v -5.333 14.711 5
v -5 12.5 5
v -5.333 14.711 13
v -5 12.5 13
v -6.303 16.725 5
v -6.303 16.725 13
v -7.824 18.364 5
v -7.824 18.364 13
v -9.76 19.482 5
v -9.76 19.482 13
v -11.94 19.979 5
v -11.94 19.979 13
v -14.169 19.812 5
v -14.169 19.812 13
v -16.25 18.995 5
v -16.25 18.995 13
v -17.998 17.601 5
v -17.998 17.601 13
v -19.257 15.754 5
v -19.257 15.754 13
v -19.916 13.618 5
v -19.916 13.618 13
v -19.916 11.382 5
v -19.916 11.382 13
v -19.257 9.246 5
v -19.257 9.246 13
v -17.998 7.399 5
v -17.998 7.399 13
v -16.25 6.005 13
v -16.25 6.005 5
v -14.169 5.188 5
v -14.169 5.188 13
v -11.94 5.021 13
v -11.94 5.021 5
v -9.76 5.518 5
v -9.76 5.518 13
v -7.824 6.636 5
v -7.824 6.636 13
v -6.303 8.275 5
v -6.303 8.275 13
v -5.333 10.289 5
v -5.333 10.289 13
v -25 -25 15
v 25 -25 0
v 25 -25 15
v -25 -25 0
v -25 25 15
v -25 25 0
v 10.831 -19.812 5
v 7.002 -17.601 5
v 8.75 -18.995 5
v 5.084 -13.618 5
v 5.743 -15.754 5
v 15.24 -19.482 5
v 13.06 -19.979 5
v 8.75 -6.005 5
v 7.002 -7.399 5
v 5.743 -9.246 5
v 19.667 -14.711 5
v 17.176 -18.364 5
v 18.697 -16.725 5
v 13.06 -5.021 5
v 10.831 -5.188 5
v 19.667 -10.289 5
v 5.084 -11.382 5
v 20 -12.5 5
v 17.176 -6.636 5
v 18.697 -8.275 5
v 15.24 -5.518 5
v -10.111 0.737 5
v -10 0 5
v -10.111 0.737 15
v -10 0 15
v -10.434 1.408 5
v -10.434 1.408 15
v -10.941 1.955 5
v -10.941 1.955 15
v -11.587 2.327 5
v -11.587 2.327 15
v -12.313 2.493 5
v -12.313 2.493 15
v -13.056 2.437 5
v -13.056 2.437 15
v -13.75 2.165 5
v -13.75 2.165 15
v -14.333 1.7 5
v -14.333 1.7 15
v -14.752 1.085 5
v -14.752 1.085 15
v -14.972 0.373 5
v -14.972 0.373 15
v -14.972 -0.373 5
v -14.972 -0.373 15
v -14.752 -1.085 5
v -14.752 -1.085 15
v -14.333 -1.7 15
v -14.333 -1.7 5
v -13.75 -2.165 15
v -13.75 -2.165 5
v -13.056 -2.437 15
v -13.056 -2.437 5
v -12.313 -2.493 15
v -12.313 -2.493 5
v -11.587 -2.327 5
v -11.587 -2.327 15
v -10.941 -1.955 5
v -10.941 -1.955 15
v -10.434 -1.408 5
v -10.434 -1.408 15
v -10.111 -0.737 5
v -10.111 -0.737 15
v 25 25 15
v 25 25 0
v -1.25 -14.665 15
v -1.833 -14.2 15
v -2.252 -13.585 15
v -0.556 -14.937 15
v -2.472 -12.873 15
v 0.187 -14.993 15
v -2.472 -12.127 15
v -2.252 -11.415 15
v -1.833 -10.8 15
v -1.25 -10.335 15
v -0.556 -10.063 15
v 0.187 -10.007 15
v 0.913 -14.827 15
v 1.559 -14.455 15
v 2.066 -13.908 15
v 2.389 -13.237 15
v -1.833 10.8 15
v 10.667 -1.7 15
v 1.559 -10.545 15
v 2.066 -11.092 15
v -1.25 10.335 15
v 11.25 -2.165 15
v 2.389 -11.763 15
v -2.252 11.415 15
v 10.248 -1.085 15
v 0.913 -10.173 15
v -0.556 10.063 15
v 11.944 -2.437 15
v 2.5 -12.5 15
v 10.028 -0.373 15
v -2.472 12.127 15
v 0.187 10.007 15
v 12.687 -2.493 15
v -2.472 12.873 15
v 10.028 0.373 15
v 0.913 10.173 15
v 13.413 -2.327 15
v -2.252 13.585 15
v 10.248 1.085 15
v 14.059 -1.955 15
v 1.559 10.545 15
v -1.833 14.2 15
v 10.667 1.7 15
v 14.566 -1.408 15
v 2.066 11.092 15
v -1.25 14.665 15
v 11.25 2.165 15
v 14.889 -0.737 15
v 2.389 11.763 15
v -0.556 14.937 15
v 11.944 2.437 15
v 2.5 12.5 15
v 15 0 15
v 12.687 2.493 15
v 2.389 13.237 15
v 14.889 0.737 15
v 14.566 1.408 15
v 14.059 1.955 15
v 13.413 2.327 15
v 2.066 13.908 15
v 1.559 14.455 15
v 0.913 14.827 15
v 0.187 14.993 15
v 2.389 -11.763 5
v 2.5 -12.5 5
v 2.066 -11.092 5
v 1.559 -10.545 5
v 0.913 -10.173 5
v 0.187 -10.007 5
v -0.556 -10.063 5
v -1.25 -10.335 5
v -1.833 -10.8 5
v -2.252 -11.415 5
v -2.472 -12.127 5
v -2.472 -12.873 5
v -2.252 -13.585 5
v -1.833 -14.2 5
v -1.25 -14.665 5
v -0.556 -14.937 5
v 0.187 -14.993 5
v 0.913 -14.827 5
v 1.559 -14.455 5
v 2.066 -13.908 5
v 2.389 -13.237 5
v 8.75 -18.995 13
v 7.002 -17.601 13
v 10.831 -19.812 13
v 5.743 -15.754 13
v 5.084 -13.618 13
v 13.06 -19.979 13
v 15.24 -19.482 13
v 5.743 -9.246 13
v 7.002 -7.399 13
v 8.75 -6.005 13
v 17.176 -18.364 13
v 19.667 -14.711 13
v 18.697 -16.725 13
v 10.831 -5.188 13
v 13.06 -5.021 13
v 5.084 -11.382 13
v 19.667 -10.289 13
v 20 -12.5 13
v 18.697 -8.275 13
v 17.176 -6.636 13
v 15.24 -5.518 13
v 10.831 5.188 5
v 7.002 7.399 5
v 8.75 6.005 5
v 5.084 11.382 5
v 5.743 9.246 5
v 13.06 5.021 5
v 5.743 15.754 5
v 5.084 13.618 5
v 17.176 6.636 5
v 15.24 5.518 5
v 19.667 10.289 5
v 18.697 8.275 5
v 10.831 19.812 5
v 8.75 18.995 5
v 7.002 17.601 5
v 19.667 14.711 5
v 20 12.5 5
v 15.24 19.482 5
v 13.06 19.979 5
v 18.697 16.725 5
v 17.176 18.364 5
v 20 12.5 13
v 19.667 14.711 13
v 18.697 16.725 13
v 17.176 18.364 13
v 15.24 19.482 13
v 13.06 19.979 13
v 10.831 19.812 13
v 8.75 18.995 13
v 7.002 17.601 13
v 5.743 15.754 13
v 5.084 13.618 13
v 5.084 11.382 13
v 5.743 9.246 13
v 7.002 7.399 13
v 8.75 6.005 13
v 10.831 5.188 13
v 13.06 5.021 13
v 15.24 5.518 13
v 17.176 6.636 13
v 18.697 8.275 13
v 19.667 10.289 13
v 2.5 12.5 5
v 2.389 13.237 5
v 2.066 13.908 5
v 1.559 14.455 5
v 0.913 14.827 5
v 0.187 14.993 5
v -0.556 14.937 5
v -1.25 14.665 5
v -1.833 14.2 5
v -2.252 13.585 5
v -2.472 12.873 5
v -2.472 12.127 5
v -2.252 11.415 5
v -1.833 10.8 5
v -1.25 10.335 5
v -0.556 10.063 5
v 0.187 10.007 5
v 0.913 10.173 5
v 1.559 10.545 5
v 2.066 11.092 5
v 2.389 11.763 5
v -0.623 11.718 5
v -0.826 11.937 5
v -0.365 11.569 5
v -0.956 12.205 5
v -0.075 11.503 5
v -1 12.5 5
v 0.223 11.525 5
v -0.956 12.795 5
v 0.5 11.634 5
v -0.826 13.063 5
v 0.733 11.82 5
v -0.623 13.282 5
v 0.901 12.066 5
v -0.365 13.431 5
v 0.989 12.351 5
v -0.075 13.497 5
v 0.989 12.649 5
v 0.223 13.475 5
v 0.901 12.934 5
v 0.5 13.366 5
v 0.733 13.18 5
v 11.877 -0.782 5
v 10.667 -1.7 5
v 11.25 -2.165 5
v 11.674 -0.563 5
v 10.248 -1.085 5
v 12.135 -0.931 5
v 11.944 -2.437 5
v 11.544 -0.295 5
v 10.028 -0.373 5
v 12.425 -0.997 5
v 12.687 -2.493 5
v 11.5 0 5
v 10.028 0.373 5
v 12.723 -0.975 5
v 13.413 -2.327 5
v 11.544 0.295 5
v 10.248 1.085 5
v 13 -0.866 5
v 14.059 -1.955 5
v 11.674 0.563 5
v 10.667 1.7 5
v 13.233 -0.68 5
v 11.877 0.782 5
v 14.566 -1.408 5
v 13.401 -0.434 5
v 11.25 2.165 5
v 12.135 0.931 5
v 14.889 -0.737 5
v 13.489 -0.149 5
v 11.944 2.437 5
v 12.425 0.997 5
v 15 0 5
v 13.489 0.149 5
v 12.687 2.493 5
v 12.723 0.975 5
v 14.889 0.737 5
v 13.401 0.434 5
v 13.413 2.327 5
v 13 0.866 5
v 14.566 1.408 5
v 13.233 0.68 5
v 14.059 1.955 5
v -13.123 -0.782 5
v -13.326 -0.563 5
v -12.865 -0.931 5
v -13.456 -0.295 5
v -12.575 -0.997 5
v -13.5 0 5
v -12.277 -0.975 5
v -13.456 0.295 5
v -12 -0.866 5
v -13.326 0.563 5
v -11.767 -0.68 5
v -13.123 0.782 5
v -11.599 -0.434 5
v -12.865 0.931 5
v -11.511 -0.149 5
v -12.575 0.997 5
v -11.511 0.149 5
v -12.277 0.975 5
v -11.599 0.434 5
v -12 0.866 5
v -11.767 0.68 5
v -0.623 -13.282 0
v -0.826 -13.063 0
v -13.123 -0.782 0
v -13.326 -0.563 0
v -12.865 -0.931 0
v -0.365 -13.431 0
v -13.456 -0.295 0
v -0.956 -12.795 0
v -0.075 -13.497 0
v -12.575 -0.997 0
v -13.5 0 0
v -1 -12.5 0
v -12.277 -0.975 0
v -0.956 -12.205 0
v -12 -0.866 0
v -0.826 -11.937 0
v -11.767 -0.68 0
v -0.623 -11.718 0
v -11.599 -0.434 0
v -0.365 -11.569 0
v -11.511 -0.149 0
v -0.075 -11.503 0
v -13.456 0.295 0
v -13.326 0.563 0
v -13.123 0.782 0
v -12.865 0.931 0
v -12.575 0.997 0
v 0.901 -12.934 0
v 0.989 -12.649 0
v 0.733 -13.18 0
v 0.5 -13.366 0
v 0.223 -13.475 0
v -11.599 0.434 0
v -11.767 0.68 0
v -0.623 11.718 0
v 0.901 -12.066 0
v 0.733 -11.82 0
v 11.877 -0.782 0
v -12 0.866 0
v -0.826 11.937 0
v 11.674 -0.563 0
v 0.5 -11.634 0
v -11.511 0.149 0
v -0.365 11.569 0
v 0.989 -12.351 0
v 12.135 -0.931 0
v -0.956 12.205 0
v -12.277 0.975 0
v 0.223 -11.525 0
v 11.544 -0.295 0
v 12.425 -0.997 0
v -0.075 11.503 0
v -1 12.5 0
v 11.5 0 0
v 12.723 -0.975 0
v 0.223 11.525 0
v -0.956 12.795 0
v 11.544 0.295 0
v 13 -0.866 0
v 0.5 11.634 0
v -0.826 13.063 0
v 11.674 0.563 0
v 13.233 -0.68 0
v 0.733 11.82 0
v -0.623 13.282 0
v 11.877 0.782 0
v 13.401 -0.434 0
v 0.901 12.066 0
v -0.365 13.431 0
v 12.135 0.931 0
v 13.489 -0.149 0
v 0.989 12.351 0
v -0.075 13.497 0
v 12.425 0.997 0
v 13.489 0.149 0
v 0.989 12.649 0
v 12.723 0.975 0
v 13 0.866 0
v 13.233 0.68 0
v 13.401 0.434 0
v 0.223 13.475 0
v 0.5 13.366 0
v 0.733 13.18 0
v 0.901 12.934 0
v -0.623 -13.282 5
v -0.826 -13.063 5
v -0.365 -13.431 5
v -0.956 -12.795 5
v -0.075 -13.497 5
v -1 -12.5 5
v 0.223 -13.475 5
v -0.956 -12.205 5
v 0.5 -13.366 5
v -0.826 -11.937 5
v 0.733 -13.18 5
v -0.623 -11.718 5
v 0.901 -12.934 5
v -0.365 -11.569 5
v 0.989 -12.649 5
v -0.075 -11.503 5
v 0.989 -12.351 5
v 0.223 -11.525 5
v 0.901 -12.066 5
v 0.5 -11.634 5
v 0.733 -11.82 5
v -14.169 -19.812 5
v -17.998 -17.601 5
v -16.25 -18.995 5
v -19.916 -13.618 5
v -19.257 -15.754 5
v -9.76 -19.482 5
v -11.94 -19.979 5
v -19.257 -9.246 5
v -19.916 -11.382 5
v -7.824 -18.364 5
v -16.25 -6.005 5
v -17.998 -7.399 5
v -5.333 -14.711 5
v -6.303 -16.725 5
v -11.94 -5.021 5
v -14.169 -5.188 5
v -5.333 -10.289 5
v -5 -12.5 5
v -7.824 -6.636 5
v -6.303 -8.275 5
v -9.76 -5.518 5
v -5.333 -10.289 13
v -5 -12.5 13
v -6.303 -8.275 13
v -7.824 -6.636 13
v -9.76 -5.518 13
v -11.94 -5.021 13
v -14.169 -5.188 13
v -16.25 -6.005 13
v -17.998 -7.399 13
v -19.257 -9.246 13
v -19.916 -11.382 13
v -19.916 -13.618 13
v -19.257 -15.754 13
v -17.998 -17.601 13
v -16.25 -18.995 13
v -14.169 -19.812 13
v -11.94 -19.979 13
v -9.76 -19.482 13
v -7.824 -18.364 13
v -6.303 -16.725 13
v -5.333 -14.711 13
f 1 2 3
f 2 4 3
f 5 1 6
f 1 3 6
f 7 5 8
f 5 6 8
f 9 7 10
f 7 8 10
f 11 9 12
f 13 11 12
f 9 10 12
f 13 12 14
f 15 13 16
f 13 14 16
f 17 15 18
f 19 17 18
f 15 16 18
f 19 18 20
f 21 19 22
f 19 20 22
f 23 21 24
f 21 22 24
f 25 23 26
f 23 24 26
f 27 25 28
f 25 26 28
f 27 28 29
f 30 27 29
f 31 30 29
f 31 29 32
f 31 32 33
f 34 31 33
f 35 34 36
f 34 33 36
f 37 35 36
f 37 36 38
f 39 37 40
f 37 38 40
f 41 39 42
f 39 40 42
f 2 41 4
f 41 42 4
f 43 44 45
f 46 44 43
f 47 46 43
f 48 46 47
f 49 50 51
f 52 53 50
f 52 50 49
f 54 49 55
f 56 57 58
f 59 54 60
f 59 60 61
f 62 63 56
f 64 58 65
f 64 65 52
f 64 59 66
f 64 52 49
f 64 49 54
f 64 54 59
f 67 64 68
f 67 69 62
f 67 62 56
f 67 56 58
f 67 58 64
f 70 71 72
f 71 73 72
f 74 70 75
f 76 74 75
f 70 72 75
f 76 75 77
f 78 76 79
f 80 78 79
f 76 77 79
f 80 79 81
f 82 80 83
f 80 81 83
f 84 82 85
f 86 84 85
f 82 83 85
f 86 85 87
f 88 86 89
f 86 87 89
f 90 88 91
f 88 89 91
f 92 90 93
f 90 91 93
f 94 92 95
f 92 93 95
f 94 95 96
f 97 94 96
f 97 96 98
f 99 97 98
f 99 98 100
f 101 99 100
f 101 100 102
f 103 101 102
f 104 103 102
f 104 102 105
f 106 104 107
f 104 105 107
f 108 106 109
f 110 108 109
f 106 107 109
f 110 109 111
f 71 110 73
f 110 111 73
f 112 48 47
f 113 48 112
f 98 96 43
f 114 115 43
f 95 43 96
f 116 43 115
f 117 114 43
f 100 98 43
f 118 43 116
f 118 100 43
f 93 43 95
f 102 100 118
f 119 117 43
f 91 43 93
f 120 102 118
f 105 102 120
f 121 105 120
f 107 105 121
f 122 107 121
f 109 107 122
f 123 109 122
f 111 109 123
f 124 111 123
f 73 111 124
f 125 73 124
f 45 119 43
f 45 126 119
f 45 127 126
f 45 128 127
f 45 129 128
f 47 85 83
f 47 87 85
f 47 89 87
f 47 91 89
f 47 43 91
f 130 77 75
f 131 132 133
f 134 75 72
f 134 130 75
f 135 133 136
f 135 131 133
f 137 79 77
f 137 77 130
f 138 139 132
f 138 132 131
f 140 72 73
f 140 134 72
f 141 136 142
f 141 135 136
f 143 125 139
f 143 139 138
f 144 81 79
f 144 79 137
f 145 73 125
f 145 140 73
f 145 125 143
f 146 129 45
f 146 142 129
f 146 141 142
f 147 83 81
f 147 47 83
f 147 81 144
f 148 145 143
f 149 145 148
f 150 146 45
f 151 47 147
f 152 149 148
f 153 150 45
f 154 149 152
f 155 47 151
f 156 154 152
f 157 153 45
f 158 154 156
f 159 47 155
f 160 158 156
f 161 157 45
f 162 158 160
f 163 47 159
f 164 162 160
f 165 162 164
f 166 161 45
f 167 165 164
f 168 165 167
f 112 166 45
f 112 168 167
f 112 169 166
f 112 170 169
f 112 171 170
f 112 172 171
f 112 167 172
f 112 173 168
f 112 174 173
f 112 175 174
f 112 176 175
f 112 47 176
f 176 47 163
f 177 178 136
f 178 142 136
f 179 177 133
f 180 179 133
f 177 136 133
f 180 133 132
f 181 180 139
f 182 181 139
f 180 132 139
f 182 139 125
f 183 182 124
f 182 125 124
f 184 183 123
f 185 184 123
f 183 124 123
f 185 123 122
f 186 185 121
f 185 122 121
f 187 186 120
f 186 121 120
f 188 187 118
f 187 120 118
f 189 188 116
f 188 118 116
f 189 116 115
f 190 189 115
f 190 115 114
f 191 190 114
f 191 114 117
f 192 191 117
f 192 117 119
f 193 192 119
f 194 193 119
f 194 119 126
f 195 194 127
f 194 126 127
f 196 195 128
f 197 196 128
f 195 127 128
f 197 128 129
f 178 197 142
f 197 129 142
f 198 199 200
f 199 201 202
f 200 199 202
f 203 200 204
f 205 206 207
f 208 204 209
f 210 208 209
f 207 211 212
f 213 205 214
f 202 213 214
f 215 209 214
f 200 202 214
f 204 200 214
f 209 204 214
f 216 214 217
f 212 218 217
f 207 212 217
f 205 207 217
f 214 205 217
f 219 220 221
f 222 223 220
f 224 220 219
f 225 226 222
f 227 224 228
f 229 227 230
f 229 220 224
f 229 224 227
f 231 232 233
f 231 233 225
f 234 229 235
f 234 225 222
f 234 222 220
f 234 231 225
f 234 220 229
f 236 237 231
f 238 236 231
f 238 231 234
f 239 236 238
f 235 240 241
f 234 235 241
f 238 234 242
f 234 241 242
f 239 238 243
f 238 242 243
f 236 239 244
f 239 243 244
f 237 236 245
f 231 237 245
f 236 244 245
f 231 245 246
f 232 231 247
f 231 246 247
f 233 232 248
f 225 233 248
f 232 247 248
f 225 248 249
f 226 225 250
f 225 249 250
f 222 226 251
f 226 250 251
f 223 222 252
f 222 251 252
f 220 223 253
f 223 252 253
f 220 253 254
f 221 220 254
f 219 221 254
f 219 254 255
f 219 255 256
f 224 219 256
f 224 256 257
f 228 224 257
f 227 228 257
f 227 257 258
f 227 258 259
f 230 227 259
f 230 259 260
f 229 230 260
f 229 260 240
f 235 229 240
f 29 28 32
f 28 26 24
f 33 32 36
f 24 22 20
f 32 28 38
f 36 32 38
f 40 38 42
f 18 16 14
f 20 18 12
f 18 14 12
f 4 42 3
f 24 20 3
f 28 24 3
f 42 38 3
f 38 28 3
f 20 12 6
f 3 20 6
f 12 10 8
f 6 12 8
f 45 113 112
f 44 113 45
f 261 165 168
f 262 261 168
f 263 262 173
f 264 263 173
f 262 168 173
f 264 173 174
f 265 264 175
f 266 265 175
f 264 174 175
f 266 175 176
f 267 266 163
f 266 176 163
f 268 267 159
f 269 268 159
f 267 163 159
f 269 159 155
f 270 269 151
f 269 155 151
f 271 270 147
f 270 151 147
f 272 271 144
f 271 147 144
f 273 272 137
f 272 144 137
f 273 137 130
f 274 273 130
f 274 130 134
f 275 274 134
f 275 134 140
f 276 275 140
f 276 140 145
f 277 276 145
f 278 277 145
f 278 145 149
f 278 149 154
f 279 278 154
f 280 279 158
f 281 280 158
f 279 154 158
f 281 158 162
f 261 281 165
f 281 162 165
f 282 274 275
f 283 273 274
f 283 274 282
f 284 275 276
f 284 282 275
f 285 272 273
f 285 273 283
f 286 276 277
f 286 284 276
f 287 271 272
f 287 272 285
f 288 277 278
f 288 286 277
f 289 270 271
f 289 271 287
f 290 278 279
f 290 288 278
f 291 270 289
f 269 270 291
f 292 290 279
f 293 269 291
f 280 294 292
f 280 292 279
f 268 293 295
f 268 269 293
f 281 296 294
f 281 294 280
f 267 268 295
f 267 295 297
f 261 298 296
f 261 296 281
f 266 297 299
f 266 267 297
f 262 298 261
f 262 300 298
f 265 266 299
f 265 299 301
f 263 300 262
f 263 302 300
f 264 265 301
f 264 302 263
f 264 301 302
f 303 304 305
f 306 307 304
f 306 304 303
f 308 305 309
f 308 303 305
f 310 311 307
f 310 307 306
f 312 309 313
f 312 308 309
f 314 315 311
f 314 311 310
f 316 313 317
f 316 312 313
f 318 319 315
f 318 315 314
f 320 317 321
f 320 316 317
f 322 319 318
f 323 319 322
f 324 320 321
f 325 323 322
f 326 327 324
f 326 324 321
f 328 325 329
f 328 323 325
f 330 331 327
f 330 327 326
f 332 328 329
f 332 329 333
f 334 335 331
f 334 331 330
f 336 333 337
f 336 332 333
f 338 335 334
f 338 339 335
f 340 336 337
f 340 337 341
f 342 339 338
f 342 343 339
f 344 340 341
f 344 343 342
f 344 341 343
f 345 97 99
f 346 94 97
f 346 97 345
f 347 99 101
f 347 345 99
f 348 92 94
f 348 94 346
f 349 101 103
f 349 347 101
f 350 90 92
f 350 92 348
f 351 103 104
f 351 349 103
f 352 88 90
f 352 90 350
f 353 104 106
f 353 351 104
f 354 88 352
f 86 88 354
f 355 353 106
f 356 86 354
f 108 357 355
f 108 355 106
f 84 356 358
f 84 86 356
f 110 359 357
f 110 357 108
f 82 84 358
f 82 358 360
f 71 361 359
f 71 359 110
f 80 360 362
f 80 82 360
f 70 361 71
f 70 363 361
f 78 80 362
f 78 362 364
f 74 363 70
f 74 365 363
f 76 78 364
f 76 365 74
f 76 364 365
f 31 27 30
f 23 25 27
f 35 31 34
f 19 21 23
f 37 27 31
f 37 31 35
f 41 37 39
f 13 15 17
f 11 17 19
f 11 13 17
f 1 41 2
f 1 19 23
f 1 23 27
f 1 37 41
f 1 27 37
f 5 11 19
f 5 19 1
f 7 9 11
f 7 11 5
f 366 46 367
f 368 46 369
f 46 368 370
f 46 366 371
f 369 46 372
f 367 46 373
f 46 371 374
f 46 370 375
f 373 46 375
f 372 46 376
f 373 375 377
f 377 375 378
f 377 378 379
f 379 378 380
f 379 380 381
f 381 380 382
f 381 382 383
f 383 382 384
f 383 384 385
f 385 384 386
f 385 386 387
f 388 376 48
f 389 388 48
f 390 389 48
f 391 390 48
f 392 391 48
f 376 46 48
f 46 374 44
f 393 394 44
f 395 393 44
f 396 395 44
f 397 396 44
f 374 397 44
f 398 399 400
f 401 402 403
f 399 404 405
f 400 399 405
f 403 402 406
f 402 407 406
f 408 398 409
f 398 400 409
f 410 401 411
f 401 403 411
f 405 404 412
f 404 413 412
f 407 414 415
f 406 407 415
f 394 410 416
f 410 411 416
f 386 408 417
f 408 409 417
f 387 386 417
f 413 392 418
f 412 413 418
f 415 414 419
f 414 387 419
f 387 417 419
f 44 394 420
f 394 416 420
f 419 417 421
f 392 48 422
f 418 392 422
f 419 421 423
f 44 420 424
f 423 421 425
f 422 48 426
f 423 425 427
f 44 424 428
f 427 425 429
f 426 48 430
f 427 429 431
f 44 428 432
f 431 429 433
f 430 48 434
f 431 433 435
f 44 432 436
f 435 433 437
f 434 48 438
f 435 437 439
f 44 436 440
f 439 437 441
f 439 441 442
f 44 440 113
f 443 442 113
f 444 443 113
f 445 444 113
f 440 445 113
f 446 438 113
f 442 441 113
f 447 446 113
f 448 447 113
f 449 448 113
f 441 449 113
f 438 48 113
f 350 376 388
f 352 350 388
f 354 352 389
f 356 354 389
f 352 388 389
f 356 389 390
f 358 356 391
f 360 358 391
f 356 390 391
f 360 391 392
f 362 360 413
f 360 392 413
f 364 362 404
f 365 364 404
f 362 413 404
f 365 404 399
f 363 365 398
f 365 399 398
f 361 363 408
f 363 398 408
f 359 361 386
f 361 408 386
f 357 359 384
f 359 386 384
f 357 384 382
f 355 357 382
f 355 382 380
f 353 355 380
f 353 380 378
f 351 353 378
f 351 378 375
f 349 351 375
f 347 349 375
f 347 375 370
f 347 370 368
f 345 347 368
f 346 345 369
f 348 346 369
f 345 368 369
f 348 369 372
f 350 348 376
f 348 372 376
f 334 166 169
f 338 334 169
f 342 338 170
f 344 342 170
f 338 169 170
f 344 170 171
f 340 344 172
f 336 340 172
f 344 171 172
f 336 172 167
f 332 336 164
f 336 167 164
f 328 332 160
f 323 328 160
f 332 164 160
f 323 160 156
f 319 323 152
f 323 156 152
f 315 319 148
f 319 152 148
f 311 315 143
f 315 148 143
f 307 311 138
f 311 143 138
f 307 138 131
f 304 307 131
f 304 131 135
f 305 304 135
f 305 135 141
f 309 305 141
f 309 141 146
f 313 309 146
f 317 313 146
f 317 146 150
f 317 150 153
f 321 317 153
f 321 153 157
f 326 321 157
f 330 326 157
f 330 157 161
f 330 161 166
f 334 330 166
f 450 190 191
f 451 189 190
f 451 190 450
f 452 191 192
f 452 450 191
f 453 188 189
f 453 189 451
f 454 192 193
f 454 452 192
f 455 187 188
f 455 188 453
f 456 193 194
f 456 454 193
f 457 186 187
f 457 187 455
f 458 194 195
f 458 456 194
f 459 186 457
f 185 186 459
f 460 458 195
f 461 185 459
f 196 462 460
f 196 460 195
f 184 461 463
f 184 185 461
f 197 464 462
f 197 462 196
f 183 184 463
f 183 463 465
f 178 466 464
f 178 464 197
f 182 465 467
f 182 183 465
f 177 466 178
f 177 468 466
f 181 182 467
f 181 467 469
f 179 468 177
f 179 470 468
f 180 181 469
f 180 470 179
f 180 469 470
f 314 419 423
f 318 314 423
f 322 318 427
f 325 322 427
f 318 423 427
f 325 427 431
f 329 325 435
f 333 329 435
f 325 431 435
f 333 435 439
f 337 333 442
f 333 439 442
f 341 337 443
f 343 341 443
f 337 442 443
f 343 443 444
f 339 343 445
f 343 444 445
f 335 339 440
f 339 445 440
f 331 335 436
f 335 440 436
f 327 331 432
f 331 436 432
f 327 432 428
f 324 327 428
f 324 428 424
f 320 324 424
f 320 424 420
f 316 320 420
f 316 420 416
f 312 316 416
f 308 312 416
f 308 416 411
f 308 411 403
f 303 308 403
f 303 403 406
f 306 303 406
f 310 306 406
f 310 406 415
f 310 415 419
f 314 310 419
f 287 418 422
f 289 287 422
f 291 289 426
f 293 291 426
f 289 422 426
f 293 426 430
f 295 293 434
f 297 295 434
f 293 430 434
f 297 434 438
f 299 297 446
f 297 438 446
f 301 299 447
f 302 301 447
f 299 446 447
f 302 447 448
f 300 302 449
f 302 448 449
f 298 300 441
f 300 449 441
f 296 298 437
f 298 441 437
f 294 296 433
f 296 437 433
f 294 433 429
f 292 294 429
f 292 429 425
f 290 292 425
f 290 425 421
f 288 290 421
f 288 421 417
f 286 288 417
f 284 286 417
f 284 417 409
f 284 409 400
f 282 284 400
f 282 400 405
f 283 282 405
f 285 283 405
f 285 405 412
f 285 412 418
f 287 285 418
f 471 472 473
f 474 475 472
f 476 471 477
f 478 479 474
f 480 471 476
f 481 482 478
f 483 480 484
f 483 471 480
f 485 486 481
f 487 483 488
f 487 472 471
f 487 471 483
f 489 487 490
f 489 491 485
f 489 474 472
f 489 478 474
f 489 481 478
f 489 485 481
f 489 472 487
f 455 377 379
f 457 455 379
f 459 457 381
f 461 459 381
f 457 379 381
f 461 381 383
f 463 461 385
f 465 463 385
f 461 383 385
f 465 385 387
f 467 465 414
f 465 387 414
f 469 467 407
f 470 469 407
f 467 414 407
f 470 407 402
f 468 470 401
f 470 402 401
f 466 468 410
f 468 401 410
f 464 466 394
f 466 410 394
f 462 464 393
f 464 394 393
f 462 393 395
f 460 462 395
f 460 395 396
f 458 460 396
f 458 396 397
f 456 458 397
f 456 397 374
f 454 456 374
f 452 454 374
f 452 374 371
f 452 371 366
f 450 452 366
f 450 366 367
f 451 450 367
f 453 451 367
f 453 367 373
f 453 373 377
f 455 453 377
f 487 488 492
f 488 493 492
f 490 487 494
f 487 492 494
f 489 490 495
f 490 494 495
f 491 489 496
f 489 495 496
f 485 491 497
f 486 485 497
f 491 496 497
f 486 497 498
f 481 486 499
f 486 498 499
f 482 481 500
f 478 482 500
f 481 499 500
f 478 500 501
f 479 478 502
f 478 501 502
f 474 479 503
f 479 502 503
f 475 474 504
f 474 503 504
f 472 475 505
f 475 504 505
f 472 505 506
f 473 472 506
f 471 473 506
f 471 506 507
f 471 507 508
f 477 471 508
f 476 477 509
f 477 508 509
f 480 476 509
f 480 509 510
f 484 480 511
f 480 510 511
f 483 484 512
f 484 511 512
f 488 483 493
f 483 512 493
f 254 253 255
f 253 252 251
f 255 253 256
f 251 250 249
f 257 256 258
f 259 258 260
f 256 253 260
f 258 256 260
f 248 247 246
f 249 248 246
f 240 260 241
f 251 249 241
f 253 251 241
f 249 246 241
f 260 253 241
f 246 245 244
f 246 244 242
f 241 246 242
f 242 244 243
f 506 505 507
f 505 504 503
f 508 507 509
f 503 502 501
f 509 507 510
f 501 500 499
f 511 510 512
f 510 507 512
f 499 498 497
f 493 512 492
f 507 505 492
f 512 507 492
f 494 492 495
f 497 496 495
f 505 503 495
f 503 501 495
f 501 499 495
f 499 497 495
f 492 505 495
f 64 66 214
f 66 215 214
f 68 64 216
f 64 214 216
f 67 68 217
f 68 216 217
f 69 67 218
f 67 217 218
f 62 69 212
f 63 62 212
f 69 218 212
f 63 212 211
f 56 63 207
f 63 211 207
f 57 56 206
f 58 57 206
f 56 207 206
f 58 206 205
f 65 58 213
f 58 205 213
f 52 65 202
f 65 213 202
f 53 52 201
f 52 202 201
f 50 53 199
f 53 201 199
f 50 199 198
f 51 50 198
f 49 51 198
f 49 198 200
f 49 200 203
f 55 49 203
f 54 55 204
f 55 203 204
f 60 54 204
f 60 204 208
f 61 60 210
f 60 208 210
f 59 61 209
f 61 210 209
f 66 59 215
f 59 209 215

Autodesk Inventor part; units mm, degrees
ref_plane "YZ Plane" through (0, 0, 0) normal (1, 0, 0) x (0, 1, 0)
ref_plane "XZ Plane" through (0, 0, 0) normal (0, 1, 0) x (-1, 0, 0)
ref_plane "XY Plane" through (0, 0, 0) normal (0, 0, 1) x (1, 0, 0)
sketch "Skizze1" plane through (0, 0, 0) normal (0, 0, 1) x (1, 0, 0)
  line L0 (-25, 25) -> (25, 25)
  line L1 (25, 25) -> (25, -25)
  line L2 (25, -25) -> (-25, -25)
  line L3 (-25, -25) -> (-25, 25)
  point P0 (0, 0)
  point P1 (25, 0)
  point P2 (0, 25)
  dimension "d0" = 50
  dimension "d1" = 50
extrude "Extrusion1" add sketch "Skizze1" along normal blind 15
ref_plane "Arbeitsebene1" through (0, 0, 13) normal (0, 0, 1) x (1, 0, 0)
sketch "Skizze4" plane through (0, 0, 13) normal (0, 0, 1) x (1, 0, 0)
  circle A0 centre (-12.5, -12.5) radius 7.5
  line L0 (-25, 25) -> (-25, -25) projected
  circle A1 centre (12.5, -12.5) radius 7.5
  line L1 (25, -25) -> (25, 25) projected
  line L2 (-25, -25) -> (25, -25) projected
  circle A2 centre (-12.5, 12.5) radius 7.5
  line L3 (25, 25) -> (-25, 25) projected
  circle A3 centre (12.5, 12.5) radius 7.5
  point P0 (0, 0)
  dimension "d6" = 15
  dimension "d7" = 12.5
  dimension "d8" = 15
  dimension "d9" = 12.5
  dimension "d10" = 12.5
  dimension "d11" = 12.5
  dimension "d12" = 15
  dimension "d13" = 12.5
  dimension "d14" = 12.5
  dimension "d15" = 15
extrude "Extrusion2" cut sketch "Skizze4" against normal blind 8 contours A0 | A1 | A2 | A3
sketch "Skizze6" plane through (0, 0, 15) normal (0, 0, 1) x (1, 0, 0)
  circle A0 centre (-12.5, 0) radius 2.5
  circle A1 centre (0, 12.5) radius 2.5
  circle A2 centre (12.5, 0) radius 2.5
  circle A3 centre (0, -12.5) radius 2.5
  line L0 (25, 25) -> (-25, 25) projected
  line L1 (-25, 25) -> (-25, -25) projected
  line L2 (25, -25) -> (25, 25) projected
  point P0 (0, 0)
  dimension "d18" = 5
  dimension "d19" = 12.5
  dimension "d20" = 25
  dimension "d21" = 5
  dimension "d22" = 12.5
  dimension "d23" = 25
  dimension "d24" = 5
  dimension "d25" = 12.5
  dimension "d26" = 25
  dimension "d27" = 5
  dimension "d28" = 12.5
  dimension "d29" = 25
extrude "Extrusion3" cut sketch "Skizze6" against normal blind 10
sketch "Skizze7" plane through (0, 0, 0) normal (0, 0, -1) x (-1, 0, 0)
  circle A0 centre (0, 12.5) radius 2.5 projected
  circle A1 centre (0, 12.5) radius 1
  circle A2 centre (0, -12.5) radius 2.5 projected
  circle A3 centre (0, -12.5) radius 1
  circle A4 centre (-12.5, 0) radius 2.5 projected
  circle A5 centre (-12.5, 0) radius 1
  circle A6 centre (12.5, 0) radius 2.5 projected
  circle A7 centre (12.5, 0) radius 1
  point P0 (0, 0)
  dimension "d32" = 2
  dimension "d33" = 2
  dimension "d34" = 2
  dimension "d35" = 2
extrude "Extrusion4" cut sketch "Skizze7" against normal blind 10 contours A1 | A3 | A5 | A7
properties part number "TestBauteil"
